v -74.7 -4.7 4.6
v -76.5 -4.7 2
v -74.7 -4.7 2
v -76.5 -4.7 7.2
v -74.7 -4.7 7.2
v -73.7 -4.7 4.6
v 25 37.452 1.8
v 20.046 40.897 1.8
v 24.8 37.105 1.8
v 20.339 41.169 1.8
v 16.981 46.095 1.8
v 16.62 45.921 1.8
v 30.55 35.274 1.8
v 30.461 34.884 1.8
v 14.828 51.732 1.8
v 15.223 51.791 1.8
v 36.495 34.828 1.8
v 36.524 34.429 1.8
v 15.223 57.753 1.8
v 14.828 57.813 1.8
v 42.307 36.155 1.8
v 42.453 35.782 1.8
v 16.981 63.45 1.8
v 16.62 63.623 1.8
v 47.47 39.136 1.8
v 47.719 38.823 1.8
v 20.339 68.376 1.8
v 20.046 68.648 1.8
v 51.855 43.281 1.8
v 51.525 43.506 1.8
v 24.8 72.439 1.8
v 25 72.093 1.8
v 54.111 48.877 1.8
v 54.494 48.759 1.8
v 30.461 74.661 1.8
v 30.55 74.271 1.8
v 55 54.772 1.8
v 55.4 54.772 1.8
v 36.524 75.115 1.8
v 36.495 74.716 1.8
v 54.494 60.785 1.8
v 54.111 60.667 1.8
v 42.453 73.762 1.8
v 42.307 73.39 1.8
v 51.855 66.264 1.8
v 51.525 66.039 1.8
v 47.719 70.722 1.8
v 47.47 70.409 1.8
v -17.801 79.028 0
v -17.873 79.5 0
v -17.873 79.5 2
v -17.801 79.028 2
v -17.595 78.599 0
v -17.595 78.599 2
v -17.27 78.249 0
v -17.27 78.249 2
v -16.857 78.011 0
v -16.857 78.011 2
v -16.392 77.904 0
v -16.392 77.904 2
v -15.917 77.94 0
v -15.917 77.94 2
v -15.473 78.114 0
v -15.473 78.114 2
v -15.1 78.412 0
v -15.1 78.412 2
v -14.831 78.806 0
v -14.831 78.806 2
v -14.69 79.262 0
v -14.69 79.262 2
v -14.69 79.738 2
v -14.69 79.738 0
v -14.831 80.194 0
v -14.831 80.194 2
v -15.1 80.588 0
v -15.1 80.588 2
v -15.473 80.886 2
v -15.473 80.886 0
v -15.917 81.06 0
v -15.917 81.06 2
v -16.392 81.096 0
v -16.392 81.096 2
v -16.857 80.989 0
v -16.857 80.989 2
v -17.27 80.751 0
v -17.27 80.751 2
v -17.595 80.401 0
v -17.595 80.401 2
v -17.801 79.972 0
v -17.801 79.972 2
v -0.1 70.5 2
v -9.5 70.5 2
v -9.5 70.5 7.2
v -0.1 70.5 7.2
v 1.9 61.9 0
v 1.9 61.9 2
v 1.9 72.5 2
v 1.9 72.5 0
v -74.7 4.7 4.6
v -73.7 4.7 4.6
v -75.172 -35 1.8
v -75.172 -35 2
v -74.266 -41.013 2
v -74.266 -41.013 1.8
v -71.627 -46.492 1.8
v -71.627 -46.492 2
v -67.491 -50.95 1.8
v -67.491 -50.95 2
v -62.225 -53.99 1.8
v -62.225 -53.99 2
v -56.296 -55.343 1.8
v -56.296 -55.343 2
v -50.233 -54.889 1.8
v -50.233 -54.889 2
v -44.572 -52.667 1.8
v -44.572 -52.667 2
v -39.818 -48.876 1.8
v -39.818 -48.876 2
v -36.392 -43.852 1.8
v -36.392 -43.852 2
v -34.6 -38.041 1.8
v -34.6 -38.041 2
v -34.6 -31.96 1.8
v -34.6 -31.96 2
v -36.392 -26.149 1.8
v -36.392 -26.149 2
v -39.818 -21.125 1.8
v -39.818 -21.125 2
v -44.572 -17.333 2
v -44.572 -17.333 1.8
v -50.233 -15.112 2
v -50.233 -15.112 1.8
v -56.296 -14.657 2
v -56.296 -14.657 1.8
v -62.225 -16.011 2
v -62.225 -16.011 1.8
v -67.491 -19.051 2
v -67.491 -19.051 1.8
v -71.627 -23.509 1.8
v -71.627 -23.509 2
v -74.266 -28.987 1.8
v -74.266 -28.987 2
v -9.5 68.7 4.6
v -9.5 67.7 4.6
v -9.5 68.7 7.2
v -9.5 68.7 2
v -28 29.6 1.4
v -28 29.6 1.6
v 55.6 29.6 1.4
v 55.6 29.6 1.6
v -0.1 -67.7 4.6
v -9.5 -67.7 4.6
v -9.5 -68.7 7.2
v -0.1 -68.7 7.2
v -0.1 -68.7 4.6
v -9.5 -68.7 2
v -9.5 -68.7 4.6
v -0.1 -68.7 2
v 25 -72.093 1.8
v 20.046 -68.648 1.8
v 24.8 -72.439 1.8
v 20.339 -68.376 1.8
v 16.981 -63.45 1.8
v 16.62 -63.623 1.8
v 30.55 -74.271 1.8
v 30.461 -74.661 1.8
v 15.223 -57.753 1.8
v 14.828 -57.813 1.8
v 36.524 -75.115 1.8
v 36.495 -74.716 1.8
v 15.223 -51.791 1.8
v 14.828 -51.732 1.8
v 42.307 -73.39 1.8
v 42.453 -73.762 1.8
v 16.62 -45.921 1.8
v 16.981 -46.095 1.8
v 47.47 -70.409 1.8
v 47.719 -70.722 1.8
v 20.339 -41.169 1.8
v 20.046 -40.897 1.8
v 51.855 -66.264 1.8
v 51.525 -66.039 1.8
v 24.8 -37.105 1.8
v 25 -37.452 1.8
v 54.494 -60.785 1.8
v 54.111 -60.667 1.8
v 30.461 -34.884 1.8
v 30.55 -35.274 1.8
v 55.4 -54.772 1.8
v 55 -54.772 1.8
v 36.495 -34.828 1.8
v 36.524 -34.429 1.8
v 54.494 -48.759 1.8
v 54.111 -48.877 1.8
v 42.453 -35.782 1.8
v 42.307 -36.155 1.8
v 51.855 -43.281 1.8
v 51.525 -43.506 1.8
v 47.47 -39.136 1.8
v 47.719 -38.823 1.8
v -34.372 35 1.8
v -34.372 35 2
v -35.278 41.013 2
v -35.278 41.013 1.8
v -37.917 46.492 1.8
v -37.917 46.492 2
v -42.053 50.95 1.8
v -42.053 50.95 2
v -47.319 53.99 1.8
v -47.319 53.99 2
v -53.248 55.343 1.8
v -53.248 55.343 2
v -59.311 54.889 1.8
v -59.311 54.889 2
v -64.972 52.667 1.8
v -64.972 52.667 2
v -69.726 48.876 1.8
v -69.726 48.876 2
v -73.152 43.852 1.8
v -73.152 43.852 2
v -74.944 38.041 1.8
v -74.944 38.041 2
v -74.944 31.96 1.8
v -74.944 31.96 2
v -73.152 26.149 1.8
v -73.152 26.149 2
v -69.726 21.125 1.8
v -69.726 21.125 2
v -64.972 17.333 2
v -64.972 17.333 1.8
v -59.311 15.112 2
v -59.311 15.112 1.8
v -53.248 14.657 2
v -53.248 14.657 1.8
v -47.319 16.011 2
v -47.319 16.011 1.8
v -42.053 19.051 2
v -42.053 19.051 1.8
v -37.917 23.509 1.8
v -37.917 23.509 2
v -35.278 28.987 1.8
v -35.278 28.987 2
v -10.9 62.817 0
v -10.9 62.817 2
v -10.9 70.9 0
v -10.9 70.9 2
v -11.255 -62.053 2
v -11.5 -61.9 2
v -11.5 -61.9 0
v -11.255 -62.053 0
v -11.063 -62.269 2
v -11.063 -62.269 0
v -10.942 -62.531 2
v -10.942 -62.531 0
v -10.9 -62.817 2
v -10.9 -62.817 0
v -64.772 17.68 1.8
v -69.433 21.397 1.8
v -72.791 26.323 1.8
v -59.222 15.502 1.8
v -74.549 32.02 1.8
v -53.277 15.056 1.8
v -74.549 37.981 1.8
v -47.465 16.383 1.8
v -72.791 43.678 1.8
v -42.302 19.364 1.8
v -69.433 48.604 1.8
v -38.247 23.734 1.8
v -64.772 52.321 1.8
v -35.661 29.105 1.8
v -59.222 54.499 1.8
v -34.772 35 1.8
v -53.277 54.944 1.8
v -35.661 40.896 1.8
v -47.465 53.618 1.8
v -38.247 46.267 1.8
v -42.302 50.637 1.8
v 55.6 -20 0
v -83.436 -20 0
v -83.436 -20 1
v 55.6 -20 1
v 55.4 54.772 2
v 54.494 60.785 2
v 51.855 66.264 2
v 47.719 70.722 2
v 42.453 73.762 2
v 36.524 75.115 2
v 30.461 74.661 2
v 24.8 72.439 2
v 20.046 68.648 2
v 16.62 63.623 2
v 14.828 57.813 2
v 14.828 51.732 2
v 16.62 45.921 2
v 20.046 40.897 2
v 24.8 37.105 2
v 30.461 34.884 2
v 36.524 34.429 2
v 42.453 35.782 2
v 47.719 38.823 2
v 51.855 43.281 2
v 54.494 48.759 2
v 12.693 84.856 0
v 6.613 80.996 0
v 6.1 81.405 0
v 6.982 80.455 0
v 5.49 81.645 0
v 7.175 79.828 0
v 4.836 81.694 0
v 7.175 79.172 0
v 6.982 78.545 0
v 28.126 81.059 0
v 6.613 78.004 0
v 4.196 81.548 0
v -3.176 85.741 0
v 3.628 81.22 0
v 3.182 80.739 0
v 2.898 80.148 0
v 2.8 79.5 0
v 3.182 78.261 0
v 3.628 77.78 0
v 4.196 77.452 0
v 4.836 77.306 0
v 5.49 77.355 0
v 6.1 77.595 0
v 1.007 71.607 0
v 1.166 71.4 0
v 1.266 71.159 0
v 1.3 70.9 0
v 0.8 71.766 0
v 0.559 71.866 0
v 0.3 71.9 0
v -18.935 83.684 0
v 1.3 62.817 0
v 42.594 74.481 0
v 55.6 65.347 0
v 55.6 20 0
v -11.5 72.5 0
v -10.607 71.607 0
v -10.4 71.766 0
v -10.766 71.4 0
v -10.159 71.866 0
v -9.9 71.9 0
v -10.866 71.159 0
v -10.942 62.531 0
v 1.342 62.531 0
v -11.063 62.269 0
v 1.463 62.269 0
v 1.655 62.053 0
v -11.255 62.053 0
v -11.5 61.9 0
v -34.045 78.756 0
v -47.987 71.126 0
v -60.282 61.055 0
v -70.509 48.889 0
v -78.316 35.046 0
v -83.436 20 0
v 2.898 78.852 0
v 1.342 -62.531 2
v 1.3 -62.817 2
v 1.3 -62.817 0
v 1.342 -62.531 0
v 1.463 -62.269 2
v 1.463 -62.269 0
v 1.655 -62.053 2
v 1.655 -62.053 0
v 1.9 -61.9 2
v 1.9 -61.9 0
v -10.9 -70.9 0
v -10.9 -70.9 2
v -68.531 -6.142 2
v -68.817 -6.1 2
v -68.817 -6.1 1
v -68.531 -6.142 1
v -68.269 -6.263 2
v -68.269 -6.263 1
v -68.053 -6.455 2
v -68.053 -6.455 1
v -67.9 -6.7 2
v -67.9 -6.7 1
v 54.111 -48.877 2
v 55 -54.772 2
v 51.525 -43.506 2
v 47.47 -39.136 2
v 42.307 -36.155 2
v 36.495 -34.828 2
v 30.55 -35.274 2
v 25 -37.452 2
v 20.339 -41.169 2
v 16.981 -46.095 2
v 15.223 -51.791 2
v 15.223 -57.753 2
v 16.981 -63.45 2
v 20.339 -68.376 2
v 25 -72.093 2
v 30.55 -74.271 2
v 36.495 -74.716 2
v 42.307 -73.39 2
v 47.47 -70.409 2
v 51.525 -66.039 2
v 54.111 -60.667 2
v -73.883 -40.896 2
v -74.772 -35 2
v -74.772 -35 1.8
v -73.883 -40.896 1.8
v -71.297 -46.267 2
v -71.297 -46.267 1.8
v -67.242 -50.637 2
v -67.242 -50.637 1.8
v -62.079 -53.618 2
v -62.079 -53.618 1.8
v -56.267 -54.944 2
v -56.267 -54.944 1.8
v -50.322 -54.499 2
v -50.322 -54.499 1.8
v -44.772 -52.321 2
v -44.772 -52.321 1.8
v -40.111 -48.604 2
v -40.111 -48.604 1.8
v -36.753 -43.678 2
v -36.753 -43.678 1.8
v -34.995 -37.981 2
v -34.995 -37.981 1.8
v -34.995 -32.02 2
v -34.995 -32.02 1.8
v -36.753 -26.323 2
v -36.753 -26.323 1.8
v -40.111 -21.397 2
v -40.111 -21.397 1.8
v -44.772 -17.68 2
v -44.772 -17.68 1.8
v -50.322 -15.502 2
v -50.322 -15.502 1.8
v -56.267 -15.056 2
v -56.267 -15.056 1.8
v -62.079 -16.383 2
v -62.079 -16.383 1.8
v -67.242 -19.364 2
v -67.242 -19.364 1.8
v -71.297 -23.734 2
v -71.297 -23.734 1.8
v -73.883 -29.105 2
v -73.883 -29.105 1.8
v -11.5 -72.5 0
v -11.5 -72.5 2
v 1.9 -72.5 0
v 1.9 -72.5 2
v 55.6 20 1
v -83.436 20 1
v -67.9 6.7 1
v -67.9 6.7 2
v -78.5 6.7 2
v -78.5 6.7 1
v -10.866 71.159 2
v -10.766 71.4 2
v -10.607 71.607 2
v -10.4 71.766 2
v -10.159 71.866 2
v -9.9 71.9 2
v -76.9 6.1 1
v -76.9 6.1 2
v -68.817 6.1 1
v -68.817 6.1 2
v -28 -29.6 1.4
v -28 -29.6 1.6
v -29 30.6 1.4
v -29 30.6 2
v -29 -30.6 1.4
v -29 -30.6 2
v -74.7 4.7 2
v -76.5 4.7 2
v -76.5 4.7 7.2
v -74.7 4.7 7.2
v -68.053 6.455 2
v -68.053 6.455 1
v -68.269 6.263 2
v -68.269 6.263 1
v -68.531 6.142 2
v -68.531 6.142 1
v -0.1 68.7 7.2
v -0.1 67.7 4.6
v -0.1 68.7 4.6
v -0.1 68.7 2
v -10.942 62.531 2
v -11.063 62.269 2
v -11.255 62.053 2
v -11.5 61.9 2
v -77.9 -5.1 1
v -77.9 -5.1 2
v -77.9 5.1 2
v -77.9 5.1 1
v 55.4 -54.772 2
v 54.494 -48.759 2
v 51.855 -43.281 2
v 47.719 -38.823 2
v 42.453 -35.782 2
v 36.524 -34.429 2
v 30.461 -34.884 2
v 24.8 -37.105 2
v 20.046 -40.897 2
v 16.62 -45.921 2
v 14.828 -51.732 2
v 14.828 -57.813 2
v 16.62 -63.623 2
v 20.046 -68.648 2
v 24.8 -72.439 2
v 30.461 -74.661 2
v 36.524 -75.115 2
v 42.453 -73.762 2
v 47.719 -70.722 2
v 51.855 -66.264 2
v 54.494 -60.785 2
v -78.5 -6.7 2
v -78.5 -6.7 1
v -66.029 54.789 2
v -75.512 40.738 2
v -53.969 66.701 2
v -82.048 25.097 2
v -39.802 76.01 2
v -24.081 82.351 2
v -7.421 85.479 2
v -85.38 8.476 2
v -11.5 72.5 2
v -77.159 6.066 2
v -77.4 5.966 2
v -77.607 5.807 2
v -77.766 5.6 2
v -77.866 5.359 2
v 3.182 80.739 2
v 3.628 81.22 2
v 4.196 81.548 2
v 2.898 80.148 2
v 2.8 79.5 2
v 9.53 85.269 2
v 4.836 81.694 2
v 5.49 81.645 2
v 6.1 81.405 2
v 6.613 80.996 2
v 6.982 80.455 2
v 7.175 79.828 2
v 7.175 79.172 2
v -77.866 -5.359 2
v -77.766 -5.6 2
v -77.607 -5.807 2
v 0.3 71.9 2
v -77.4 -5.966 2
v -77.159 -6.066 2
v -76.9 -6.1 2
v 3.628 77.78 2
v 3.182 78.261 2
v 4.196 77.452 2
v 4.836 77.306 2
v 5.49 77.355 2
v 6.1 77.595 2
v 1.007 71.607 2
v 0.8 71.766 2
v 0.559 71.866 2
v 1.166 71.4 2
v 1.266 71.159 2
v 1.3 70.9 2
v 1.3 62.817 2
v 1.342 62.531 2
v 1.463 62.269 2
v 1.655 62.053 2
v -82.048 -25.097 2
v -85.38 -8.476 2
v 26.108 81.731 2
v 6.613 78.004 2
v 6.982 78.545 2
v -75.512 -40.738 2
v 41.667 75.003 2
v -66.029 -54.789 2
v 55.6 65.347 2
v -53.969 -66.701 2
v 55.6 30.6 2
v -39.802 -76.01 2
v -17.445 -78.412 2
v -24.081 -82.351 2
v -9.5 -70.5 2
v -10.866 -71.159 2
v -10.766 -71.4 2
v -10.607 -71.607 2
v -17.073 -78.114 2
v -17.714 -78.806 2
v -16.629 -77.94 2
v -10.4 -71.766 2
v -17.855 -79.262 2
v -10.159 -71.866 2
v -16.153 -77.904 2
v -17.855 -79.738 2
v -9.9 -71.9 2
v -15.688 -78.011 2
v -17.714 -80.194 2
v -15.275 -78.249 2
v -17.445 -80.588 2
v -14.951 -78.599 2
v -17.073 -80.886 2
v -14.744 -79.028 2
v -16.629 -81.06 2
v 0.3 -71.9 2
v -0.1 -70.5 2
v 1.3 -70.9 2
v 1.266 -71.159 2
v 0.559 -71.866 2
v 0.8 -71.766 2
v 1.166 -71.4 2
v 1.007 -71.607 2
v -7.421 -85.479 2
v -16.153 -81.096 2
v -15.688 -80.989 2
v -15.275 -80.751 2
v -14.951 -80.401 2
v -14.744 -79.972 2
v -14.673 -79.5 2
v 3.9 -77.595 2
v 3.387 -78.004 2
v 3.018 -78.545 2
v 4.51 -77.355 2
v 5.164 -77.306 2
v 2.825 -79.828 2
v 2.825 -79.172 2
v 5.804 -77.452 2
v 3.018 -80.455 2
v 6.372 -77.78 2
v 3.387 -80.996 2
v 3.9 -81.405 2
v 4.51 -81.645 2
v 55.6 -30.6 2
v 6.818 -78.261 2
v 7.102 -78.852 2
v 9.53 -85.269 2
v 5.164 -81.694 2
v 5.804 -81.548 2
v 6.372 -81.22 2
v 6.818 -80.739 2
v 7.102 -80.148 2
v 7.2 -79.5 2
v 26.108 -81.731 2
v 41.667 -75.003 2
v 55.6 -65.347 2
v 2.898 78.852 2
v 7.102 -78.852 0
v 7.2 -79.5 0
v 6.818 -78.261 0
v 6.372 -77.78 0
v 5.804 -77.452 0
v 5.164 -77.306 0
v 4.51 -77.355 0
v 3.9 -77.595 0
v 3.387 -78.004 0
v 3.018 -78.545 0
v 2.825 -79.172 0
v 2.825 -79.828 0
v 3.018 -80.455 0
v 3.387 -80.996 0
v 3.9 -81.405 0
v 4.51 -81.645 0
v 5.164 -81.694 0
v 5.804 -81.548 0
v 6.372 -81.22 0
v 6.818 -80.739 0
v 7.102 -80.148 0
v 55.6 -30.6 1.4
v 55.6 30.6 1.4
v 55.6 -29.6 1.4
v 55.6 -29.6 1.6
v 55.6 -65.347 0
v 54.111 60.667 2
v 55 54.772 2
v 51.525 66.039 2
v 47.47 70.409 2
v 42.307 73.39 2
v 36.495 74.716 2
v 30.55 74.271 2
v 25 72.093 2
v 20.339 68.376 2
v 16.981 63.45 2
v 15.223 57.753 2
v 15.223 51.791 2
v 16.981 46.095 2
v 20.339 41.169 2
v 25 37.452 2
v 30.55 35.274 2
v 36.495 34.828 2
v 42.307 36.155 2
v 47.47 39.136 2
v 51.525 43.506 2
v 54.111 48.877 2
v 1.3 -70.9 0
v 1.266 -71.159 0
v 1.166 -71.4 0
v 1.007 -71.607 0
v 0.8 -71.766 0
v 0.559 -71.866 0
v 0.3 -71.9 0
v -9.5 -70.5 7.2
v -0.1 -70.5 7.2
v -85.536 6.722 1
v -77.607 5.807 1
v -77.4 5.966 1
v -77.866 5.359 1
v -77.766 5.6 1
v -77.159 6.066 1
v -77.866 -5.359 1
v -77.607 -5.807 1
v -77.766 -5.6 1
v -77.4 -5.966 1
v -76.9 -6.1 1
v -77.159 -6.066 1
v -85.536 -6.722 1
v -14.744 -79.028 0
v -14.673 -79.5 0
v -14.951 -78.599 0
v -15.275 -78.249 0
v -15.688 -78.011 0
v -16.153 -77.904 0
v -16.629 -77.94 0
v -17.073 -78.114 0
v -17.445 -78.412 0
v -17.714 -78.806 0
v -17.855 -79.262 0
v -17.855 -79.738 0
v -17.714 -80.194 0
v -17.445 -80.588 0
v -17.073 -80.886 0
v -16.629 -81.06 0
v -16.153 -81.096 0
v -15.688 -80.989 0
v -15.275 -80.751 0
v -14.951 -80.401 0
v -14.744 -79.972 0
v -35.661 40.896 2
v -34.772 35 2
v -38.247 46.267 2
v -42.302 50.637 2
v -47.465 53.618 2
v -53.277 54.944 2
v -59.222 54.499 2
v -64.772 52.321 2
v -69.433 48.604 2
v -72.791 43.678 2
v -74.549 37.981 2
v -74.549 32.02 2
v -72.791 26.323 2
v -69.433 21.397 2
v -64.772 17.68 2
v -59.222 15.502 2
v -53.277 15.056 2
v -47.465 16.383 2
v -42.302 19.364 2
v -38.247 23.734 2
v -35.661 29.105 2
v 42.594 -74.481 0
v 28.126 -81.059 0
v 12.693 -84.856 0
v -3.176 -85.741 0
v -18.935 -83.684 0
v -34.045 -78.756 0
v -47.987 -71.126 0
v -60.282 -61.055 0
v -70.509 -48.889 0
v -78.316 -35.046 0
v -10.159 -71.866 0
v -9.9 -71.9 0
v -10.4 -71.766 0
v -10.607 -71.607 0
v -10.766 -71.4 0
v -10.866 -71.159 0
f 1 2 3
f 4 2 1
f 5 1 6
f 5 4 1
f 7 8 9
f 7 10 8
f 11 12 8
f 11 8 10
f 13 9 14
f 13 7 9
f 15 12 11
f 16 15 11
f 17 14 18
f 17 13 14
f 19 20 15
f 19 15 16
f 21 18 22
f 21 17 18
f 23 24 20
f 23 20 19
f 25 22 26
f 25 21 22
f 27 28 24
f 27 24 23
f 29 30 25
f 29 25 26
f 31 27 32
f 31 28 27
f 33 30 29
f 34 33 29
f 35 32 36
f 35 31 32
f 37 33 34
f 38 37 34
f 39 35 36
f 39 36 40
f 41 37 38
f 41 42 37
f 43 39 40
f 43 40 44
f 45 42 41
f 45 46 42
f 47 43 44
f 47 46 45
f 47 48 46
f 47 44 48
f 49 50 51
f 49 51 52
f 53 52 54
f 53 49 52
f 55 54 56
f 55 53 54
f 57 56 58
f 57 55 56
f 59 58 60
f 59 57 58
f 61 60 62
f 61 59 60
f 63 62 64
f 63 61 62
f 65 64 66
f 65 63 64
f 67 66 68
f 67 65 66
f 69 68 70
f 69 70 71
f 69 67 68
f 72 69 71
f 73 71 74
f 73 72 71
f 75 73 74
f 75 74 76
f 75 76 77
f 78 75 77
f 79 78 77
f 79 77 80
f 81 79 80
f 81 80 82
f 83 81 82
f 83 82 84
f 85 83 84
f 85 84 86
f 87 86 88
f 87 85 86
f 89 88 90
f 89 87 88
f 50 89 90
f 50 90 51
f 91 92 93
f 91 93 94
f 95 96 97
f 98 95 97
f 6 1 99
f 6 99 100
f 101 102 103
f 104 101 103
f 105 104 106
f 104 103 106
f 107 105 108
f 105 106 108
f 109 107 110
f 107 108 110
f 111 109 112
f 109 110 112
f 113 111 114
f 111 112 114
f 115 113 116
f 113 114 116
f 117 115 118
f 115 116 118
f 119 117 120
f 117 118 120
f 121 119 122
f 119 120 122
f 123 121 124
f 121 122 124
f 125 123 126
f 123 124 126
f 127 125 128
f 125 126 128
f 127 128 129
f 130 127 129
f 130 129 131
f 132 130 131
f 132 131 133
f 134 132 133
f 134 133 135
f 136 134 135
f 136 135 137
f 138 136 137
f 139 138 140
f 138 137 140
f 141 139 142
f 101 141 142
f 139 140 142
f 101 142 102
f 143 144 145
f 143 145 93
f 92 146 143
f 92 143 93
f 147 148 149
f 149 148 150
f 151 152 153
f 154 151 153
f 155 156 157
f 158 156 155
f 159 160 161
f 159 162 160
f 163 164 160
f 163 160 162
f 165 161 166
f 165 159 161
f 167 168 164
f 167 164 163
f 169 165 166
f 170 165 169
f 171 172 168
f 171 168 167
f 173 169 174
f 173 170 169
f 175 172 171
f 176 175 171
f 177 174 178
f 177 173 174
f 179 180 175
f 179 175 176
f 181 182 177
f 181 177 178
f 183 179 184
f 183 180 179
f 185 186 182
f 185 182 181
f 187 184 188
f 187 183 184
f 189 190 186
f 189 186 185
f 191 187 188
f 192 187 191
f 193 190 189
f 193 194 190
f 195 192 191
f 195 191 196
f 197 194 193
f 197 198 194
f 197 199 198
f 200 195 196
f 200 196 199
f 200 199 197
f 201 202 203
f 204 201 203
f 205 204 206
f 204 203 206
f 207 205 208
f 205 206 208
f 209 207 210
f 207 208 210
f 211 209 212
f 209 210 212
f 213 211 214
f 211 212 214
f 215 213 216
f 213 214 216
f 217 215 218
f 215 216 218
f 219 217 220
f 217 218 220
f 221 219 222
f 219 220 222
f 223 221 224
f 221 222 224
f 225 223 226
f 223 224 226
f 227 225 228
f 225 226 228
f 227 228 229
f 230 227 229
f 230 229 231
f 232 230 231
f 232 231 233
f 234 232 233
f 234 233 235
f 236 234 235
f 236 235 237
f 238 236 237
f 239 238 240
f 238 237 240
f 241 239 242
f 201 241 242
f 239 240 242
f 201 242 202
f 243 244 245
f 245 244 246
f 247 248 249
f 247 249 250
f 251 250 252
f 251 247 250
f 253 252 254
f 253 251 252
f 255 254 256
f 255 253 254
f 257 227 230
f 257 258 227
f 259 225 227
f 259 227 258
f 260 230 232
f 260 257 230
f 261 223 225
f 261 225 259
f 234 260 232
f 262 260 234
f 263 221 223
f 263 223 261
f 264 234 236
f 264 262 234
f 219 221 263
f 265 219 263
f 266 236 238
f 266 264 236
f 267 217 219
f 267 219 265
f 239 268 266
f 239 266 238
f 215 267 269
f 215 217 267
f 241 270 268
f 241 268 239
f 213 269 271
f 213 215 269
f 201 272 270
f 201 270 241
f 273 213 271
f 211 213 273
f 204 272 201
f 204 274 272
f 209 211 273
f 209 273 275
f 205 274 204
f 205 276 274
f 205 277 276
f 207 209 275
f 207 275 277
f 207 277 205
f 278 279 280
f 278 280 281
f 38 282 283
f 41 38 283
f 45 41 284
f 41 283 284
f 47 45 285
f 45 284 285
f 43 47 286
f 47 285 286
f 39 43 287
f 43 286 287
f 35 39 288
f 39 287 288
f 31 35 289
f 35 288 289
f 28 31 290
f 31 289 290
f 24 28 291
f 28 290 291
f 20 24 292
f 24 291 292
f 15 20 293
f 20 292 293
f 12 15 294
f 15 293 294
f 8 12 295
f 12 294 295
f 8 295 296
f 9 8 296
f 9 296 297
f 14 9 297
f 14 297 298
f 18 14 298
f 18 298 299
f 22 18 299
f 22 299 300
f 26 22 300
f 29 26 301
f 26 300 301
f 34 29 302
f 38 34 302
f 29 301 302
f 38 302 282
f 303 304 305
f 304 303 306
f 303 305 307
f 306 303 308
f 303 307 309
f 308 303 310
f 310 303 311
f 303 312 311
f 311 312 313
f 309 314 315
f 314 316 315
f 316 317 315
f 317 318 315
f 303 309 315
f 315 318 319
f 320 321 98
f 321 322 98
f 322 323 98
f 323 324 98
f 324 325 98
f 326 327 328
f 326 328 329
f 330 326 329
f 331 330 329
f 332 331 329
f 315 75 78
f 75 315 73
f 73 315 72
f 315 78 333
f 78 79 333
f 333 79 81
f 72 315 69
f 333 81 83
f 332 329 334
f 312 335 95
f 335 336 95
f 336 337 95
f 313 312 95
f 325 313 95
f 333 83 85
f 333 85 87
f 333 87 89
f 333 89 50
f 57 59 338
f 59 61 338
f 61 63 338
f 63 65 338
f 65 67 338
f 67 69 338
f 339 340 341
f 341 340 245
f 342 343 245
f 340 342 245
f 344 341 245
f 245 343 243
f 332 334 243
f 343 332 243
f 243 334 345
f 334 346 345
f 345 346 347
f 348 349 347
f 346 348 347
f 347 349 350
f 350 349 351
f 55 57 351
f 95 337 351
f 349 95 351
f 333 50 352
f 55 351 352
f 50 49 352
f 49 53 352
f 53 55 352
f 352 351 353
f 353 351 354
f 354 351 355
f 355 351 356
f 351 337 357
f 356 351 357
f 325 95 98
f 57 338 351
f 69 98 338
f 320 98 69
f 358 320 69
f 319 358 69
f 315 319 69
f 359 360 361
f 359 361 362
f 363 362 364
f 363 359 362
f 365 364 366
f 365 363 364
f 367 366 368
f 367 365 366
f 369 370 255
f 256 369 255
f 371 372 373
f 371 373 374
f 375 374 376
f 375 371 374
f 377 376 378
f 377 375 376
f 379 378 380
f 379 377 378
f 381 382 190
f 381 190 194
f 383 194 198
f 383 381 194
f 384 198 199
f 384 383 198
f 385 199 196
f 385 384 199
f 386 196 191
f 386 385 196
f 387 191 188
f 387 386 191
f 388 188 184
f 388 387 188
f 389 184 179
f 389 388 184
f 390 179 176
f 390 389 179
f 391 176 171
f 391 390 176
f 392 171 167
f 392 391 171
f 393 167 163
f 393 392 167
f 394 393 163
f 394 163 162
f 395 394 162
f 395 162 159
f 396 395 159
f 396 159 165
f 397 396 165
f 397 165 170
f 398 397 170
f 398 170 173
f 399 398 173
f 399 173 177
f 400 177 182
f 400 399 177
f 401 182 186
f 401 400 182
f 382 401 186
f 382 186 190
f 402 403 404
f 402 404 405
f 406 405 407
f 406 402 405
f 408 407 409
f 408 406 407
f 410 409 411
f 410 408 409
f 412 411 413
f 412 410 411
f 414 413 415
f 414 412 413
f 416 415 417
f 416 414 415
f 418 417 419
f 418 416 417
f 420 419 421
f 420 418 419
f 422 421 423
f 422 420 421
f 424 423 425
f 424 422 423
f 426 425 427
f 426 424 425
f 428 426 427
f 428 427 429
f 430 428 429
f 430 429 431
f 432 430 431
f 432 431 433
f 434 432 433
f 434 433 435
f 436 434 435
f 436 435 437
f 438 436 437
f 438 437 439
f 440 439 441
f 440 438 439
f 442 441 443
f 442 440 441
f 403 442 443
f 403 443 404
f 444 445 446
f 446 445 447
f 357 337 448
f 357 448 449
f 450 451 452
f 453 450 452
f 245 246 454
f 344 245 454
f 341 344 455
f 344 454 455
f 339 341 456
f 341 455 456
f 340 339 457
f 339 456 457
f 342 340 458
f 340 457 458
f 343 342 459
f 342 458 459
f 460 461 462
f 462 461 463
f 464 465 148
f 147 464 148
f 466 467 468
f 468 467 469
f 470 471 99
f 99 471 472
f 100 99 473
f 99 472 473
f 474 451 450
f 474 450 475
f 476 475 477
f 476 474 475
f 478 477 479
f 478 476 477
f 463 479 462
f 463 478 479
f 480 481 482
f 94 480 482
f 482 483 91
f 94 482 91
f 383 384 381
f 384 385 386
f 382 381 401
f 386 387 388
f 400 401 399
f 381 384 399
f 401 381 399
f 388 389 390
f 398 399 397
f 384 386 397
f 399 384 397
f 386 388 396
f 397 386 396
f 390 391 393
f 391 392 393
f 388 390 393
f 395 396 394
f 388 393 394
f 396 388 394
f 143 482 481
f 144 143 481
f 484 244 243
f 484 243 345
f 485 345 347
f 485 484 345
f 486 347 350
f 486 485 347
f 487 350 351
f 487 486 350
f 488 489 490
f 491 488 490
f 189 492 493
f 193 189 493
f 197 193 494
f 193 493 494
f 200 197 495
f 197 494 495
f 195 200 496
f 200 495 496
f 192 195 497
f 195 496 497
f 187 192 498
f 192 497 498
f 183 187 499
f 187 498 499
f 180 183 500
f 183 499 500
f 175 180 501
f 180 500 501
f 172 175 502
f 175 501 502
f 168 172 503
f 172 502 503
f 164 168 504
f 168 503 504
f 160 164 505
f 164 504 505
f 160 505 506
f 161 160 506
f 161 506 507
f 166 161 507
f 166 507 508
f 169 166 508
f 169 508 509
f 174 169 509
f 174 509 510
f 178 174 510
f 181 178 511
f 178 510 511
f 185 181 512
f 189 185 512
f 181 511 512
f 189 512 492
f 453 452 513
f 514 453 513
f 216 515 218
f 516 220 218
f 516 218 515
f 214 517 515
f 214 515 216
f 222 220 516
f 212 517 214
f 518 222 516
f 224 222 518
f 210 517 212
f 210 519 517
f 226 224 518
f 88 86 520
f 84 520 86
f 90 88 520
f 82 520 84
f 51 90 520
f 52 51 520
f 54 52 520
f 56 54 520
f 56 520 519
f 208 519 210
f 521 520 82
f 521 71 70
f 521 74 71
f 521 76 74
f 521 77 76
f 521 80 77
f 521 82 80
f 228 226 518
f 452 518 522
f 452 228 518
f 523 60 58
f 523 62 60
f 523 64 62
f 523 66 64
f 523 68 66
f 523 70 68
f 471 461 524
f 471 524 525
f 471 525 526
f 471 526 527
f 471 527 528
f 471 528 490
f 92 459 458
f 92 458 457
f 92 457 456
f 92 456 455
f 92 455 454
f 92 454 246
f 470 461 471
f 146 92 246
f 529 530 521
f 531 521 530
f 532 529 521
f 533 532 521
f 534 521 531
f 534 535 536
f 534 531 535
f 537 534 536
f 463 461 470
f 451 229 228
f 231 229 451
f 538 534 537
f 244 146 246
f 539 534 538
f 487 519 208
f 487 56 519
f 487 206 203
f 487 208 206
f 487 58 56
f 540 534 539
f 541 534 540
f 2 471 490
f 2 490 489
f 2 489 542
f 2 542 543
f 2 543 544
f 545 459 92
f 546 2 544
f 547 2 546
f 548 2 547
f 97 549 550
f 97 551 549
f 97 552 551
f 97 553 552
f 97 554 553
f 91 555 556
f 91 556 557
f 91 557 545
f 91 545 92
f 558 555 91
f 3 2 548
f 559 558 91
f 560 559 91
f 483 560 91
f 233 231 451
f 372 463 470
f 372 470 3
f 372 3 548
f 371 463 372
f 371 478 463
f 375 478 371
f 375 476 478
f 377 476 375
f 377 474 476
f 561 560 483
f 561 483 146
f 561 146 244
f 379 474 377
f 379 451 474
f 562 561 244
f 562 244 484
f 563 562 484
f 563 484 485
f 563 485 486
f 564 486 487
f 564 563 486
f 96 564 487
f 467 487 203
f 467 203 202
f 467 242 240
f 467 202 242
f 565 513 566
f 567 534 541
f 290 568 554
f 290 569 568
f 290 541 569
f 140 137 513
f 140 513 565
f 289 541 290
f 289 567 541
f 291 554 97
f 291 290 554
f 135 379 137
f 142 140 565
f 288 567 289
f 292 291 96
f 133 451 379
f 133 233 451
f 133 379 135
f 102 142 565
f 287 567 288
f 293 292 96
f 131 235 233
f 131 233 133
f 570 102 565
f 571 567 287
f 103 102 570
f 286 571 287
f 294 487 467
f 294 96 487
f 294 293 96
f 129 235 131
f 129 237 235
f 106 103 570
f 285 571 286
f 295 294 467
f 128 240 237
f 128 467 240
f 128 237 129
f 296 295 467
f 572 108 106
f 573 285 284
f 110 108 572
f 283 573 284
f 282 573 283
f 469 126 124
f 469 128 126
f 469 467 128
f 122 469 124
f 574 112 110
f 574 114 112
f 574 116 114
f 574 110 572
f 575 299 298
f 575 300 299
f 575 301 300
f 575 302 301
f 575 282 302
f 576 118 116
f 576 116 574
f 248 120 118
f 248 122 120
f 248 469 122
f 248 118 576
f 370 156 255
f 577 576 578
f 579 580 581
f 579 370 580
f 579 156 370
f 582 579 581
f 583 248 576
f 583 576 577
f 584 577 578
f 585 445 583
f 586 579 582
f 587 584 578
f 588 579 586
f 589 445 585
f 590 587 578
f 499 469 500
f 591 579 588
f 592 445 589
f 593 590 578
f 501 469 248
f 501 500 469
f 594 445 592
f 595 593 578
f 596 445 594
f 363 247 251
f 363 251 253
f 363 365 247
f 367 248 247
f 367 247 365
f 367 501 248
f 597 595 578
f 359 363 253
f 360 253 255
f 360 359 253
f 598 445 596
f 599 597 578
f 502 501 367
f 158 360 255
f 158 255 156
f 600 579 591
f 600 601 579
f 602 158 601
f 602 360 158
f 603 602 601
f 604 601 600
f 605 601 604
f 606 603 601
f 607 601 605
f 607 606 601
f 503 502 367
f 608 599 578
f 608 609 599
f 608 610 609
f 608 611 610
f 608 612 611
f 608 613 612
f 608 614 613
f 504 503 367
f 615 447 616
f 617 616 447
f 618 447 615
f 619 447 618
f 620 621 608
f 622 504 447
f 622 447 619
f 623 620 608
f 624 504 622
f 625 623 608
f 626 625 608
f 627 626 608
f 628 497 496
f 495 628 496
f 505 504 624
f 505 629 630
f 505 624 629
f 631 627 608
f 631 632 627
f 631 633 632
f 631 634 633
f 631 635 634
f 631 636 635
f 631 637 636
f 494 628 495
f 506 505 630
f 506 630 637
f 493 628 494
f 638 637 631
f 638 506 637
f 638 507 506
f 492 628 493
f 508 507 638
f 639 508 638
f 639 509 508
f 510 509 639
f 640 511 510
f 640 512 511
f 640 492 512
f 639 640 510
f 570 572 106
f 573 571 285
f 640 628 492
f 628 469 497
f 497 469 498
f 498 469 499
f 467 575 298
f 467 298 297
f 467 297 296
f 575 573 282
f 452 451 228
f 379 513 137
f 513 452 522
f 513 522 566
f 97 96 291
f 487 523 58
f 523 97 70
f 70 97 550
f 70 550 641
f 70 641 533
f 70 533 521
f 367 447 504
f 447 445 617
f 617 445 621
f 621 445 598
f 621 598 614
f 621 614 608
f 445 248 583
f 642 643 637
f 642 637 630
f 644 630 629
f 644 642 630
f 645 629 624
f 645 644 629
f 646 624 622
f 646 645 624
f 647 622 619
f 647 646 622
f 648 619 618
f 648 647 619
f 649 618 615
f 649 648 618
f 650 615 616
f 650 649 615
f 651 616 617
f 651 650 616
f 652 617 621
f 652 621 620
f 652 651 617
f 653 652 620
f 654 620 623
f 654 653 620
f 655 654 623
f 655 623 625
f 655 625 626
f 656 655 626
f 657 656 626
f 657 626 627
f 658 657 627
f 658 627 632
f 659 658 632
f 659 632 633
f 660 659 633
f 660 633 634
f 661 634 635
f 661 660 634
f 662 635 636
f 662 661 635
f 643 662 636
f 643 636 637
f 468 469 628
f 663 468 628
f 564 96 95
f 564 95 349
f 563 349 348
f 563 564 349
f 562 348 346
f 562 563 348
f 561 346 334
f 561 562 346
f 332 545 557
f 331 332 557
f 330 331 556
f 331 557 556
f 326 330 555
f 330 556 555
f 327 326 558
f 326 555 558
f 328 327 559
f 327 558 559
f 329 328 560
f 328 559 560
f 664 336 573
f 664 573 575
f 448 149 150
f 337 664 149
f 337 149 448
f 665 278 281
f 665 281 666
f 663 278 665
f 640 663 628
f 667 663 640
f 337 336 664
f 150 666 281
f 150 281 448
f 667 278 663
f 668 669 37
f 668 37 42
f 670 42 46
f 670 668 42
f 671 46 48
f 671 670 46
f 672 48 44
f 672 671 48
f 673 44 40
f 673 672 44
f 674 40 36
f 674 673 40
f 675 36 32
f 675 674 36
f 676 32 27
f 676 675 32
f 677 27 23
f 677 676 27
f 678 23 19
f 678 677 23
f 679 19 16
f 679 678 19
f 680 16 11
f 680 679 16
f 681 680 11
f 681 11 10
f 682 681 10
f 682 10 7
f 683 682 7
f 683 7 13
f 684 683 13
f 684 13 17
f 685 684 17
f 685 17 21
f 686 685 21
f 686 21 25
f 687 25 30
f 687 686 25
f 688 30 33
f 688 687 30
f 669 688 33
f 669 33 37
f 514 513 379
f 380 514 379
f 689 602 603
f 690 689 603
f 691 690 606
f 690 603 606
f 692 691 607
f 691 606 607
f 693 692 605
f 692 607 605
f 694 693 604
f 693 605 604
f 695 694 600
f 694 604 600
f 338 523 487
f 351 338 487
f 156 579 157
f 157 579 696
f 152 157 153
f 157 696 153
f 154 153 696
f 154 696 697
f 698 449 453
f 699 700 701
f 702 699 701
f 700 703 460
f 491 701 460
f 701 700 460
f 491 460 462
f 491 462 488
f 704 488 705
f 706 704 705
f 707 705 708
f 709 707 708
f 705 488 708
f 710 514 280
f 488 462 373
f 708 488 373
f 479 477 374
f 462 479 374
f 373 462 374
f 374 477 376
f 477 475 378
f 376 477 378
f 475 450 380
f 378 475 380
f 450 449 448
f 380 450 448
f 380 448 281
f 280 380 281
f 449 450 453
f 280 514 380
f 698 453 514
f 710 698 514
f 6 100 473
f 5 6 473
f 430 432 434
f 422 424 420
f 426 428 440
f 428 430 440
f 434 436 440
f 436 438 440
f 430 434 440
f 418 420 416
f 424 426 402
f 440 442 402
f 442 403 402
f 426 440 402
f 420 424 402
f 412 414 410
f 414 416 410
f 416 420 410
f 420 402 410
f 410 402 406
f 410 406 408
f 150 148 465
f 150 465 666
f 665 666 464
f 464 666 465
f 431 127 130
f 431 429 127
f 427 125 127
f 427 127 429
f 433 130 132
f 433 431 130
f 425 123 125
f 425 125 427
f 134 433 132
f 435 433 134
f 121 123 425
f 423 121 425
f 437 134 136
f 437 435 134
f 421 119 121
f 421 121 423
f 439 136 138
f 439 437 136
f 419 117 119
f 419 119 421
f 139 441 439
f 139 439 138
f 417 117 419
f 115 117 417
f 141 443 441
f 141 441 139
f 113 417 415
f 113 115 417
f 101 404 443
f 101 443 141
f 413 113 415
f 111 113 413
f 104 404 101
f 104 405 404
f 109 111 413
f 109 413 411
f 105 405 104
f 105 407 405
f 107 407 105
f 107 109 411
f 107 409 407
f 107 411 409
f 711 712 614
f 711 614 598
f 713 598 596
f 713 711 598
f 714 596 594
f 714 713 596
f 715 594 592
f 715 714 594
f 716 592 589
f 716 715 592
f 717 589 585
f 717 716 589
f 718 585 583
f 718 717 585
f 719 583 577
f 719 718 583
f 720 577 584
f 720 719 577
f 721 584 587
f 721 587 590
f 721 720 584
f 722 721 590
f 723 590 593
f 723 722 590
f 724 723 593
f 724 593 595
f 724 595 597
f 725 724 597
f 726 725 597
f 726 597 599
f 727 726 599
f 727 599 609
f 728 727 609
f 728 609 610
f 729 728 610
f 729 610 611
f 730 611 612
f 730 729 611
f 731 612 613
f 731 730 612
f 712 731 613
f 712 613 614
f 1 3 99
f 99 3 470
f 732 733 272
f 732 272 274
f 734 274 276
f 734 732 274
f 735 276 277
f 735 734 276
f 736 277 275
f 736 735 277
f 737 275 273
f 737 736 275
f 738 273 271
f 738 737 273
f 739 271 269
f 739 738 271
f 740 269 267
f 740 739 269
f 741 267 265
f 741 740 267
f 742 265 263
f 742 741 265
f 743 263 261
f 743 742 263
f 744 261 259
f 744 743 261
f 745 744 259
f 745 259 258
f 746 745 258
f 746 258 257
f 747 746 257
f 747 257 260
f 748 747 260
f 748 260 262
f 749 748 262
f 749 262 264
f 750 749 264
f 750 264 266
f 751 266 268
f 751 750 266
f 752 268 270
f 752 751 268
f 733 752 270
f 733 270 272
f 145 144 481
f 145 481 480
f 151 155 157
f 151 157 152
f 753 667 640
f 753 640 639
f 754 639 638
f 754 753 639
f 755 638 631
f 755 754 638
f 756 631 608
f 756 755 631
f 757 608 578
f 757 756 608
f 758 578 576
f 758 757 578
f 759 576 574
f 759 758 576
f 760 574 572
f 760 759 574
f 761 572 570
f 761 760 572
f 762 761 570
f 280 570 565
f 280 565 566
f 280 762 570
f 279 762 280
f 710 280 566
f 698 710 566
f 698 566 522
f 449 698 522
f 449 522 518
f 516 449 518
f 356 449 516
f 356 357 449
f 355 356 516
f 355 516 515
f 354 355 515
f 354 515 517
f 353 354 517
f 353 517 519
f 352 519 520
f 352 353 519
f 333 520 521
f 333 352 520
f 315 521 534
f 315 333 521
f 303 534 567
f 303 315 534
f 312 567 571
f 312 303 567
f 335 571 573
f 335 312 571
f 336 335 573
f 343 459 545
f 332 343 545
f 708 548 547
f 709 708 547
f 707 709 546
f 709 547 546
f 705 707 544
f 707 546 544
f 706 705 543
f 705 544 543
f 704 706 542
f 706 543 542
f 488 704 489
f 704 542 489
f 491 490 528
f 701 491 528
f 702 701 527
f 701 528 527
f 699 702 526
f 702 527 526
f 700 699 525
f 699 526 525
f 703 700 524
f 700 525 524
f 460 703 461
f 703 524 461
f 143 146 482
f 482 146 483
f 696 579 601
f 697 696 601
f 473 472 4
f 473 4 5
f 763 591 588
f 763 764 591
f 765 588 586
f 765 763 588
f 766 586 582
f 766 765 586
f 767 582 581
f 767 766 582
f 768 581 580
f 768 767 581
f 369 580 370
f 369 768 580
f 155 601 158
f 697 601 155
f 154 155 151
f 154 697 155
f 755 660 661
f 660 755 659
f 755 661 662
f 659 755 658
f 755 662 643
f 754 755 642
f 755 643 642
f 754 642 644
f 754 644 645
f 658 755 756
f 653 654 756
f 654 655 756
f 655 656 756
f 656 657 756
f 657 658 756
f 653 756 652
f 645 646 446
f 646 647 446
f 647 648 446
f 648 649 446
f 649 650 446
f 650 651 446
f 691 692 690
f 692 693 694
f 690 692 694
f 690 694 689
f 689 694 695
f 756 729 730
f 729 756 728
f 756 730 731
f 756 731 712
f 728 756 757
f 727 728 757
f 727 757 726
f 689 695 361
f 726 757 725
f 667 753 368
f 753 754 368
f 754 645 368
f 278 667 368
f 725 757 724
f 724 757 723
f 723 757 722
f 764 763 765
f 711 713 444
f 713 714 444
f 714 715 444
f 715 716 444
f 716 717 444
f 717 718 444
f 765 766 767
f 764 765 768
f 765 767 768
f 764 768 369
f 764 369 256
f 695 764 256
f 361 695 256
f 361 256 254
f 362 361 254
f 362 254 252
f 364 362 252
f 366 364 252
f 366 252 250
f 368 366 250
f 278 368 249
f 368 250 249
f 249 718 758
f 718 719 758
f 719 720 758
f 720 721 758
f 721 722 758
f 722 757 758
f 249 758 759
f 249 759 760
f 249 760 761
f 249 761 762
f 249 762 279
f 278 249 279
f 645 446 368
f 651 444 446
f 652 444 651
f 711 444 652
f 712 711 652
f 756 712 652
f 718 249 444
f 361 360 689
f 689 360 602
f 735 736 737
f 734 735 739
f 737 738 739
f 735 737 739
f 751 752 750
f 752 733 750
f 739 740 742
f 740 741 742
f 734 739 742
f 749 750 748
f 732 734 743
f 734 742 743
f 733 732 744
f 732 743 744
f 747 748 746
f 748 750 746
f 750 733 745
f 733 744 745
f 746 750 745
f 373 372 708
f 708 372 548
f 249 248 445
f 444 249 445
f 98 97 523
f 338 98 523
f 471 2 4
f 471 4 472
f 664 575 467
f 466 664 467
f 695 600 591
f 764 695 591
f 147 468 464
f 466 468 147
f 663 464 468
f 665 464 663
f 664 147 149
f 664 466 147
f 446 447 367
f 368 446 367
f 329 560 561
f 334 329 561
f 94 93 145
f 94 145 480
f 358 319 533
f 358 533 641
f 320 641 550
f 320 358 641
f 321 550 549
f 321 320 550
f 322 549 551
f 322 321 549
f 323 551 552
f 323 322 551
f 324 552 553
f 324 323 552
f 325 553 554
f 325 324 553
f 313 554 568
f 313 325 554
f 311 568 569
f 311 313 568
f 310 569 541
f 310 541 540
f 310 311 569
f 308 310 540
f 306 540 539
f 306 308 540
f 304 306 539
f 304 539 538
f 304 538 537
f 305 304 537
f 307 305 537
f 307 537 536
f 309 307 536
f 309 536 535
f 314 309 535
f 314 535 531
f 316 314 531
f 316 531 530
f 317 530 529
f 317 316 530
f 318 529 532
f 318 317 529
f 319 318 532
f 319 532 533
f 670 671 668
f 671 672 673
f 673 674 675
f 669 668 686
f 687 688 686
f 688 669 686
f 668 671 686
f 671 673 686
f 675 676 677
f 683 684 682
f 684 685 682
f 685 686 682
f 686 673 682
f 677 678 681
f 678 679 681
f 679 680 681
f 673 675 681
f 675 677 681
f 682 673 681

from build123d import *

# Parameters (mm, degrees)
SKETCH1_R           = 2.2
SKETCH1_R_2         = 1.6
BOSS_EXTRUDE1_DEPTH = 2
SKETCH3_R           = 20.4
SKETCH3_R_2         = 20
CUT_EXTRUDE9_DEPTH  = 0.2
SKETCH6_W           = 9.4
SKETCH6_H           = 1.8
BOSS_EXTRUDE2_DEPTH = 5.2
SKETCH7_W           = 1.8
SKETCH7_H           = 9.4
BOSS_EXTRUDE3_DEPTH = 5.2
BOSS_EXTRUDE4_DEPTH = 9.4
CUT_EXTRUDE10_DEPTH = 0.6
SKETCH11_W          = 83.6
SKETCH11_H          = 59.2
CUT_EXTRUDE11_DEPTH = 0.4
BOSS_EXTRUDE5_DEPTH = 9.4
CUT_EXTRUDE12_DEPTH = 1
CUT_EXTRUDE13_DEPTH = 10
FILLET1_R           = 1
FILLET4_R           = 1
FILLET8_R           = 1
FILLET9_R           = 1
FILLET10_R          = 1


with BuildPart() as part:
    # Sketch1 → Boss-Extrude1 (new body)
    with BuildSketch(Plane(origin=(0, 0, 0), x_dir=(0, 1, 0), z_dir=(0, 0, 1))):
        with BuildLine():
            Line((65.347379442, -55.6), (-65.347379442, -55.6))
            ThreePointArc((-65.347379442, -55.6), (0, 85.8), (65.347379442, -55.6))
        make_face()
        with Locations(Location((-79.5, -5, 0), (0, 0, 270))):
            Circle(SKETCH1_R, mode=Mode.SUBTRACT)
        with Locations(Location((-79.5, 16.27256024, 0), (0, 0, 270))):
            Circle(SKETCH1_R_2, mode=Mode.SUBTRACT)
        with Locations(Location((79.5, 16.27256024, 0), (0, 0, 90))):
            Circle(SKETCH1_R_2, mode=Mode.SUBTRACT)
        with Locations(Location((79.5, -5, 0), (0, 0, 90))):
            Circle(SKETCH1_R, mode=Mode.SUBTRACT)
    extrude(amount=BOSS_EXTRUDE1_DEPTH)

    # Sketch3 → Cut-Extrude9 (cut)
    # profile 1 of 4: a face of its own
    with BuildSketch(Plane.XY.offset(2)):
        with Locations((-54.772, 35.000400226)):
            Circle(SKETCH3_R)
        with Locations((-54.772, 35.000400226)):
            Circle(SKETCH3_R_2, mode=Mode.SUBTRACT)
    # profile 2 of 4: a face of its own
    with BuildSketch(Plane.XY.offset(2)):
        with Locations(Location((-54.772, -35.000400226, 0), (0, 0, 180))):
            Circle(SKETCH3_R)
        with Locations(Location((-54.772, -35.000400226, 0), (0, 0, 180))):
            Circle(SKETCH3_R_2, mode=Mode.SUBTRACT)
    # profile 3 of 4: a face of its own
    with BuildSketch(Plane.XY.offset(2)):
        with Locations((35, -54.772255751)):
            Circle(SKETCH3_R)
        with Locations((35, -54.772255751)):
            Circle(SKETCH3_R_2, mode=Mode.SUBTRACT)
    # profile 4 of 4: a face of its own
    with BuildSketch(Plane.XY.offset(2)):
        with Locations((35, 54.772255751)):
            Circle(SKETCH3_R)
        with Locations((35, 54.772255751)):
            Circle(SKETCH3_R_2, mode=Mode.SUBTRACT)
    extrude(amount=-CUT_EXTRUDE9_DEPTH, mode=Mode.SUBTRACT)

    # Sketch6 → Boss-Extrude2 (add)
    with BuildSketch(Plane.XY.offset(2)):
        with Locations((-4.8, -69.6)):
            Rectangle(SKETCH6_W, SKETCH6_H)
        with Locations((-4.8, 69.6)):
            Rectangle(SKETCH6_W, SKETCH6_H)
    extrude(amount=BOSS_EXTRUDE2_DEPTH)

    # Sketch7 → Boss-Extrude3 (add)
    with BuildSketch(Plane.XY.offset(2)):
        with Locations((-75.6, 0)):
            Rectangle(SKETCH7_W, SKETCH7_H)
    extrude(amount=BOSS_EXTRUDE3_DEPTH)

    # Sketch8 → Boss-Extrude4 (add)
    with BuildSketch(Plane.YZ.offset(-0.1)):
        Polygon((-68.7, 7.2), (-68.7, 4.6), (-67.7, 4.6), align=None)
        Polygon((67.7, 4.6), (68.7, 7.2), (68.7, 4.6), align=None)
    extrude(amount=-BOSS_EXTRUDE4_DEPTH)

    # Sketch10 → Cut-Extrude10 (cut)
    with BuildSketch(Plane.XY.offset(2)):
        Polygon((55.6, -29.6), (-28, -29.6), (-28, 29.6), (55.6, 29.6), (55.6, 30.6), (-29, 30.6), (-29, -30.6), (55.6, -30.6), align=None)
    extrude(amount=-CUT_EXTRUDE10_DEPTH, mode=Mode.SUBTRACT)

    # Sketch11 → Cut-Extrude11 (cut)
    with BuildSketch(Plane.XY.offset(2)):
        with Locations((13.8, 0)):
            Rectangle(SKETCH11_W, SKETCH11_H)
    extrude(amount=-CUT_EXTRUDE11_DEPTH, mode=Mode.SUBTRACT)

    # Sketch13 → Boss-Extrude5 (add)
    with BuildSketch(Plane.XZ.offset(4.7)):
        Polygon((-74.7, 7.2), (-74.7, 4.6), (-73.7, 4.6), align=None)
    extrude(amount=-BOSS_EXTRUDE5_DEPTH)

    # Sketch15 → Cut-Extrude12 (cut)
    with BuildSketch(Plane(origin=(0, 0, 0), x_dir=(1, 0, 0), z_dir=(0, 0, -1))):
        with BuildLine():
            Line((-83.436442877, 20), (55.6, 20))
            Line((55.6, 20), (55.6, -20))
            Line((55.6, -20), (-83.436442877, -20))
            ThreePointArc((-83.436442877, -20), (-85.8, 0), (-83.436442877, 20))
        make_face()
    extrude(amount=-CUT_EXTRUDE12_DEPTH, mode=Mode.SUBTRACT)

    # Sketch17 → Cut-Extrude13 (cut)
    with BuildSketch(Plane.XY.offset(2)):
        Polygon((-10.9, -71.9), (-10.9, -61.9), (-11.5, -61.9), (-11.5, -72.5), (1.9, -72.5), (1.9, -61.9), (1.3, -61.9), (1.3, -71.9), align=None)
        Polygon((1.9, 72.5), (-11.5, 72.5), (-11.5, 61.9), (-10.9, 61.9), (-10.9, 71.9), (1.3, 71.9), (1.3, 61.9), (1.9, 61.9), align=None)
        Polygon((-78.5, 6.7), (-78.5, -6.7), (-67.9, -6.7), (-67.9, -6.1), (-77.9, -6.1), (-77.9, 6.1), (-67.9, 6.1), (-67.9, 6.7), align=None)
    extrude(amount=-CUT_EXTRUDE13_DEPTH, mode=Mode.SUBTRACT)

    # Fillet1
    fillet1_edges = [part.edges().sort_by_distance(p)[0] for p in [
        (-10.9, -71.9, 1),
    ]]
    fillet(fillet1_edges, radius=FILLET1_R)

    # Fillet4
    # the kernel refuses this fillet: 1 mm, written as the material it adds along each edge
    with BuildSketch(Plane(origin=(1.3, -61.9, 2), x_dir=(0, -1, 0), z_dir=(0, 0, -1))) as fillet4_piece_1:
        with BuildLine():
            CenterArc((0.916515139, -1), FILLET4_R, 90, 66.421821522)
            Line((0, -0.6), (0, 0))
            Line((0, 0), (0.916515139, 0))
        make_face()
    extrude(amount=2)
    # the kernel refuses this fillet: 1 mm, written as the material it takes off along each edge
    with BuildSketch(Plane(origin=(1.3, -71.9, 4.5), x_dir=(-1, 0, 0), z_dir=(0, 0, -1))) as fillet4_2_piece_1:
        with BuildLine():
            CenterArc((FILLET4_R, FILLET4_R), FILLET4_R, 180, 90)
            Line((0, FILLET4_R), (0, 0))
            Line((0, 0), (FILLET4_R, 0))
        make_face()
    extrude(amount=7, mode=Mode.SUBTRACT)

    # Fillet8
    # the kernel refuses this fillet: 1 mm, written as the material it adds along each edge
    with BuildSketch(Plane(origin=(-10.9, -61.9, 2), x_dir=(0, -1, 0), z_dir=(0, 0, -1))) as fillet8_piece_1:
        with BuildLine():
            CenterArc((0.916515139, 1), FILLET8_R, 203.578178478, 66.421821522)
            Line((0, 0.6), (-0.018330303, 0.592))
            ThreePointArc((-0.018330303, 0.592), (-0.02, 0.3), (-0.02, 0))
            Line((-0.02, 0), (0, -0.02))
            Line((0, -0.02), (0.916515139, -0.02))
            Line((0.916515139, -0.02), (0.916515139, 0))
        make_face()
    extrude(amount=2)

    # Fillet9
    # the kernel refuses this fillet: 1 mm, written as the material it adds along each edge
    with BuildSketch(Plane(origin=(-10.9, 61.9, 2), x_dir=(-1, 0, 0), z_dir=(0, 0, -1))) as fillet9_piece_1:
        with BuildLine():
            CenterArc((1, 0.916515139), FILLET9_R, 180, 66.421821522)
            Line((0, 0.916515139), (0, 0))
            Line((0, 0), (0.6, 0))
        make_face()
    extrude(amount=2)
    with BuildSketch(Plane(origin=(1.3, 61.9, 2), x_dir=(1, 0, 0), z_dir=(0, 0, -1))) as fillet9_piece_2:
        with BuildLine():
            CenterArc((1, -0.916515139), FILLET9_R, 113.578178478, 66.421821522)
            Line((0, -0.916515139), (0, 0))
            Line((0, 0), (0.6, 0))
        make_face()
    extrude(amount=2)
    # the kernel refuses this fillet: 1 mm, written as the material it takes off along each edge
    with BuildSketch(Plane(origin=(1.3, 71.9, 4.5), x_dir=(0, -1, 0), z_dir=(0, 0, -1)), Plane(origin=(-10.9, 71.9, 4.5), x_dir=(1, 0, 0), z_dir=(0, 0, -1))) as fillet9_2_piece_1:
        with BuildLine():
            CenterArc((FILLET9_R, FILLET9_R), FILLET9_R, 180, 90)
            Line((0, FILLET9_R), (0, 0))
            Line((0, 0), (FILLET9_R, 0))
        make_face()
    extrude(amount=7, mode=Mode.SUBTRACT)

    # Fillet10
    # the kernel refuses this fillet: 1 mm, written as the material it adds along each edge
    with BuildSketch(Plane(origin=(-67.9, -6.1, 2), x_dir=(0, -1, 0), z_dir=(0, 0, -1))) as fillet10_piece_1:
        with BuildLine():
            CenterArc((1, 0.916515139), FILLET10_R, 180, 66.421821522)
            Line((0, 0.916515139), (0, 0))
            Line((0, 0), (0.6, 0))
        make_face()
    extrude(amount=1)
    with BuildSketch(Plane(origin=(-67.9, 6.1, 2), x_dir=(0, 1, 0), z_dir=(0, 0, -1))) as fillet10_piece_2:
        with BuildLine():
            CenterArc((1, -0.916515139), FILLET10_R, 113.578178478, 66.421821522)
            Line((0, -0.916515139), (0, 0))
            Line((0, 0), (0.6, 0))
        make_face()
    extrude(amount=1)
    # the kernel refuses this fillet: 1 mm, written as the material it takes off along each edge
    with BuildSketch(Plane(origin=(-77.9, -6.1, 4.5), x_dir=(1, 0, 0), z_dir=(0, 0, -1))) as fillet10_2_piece_1:
        with BuildLine():
            CenterArc((FILLET10_R, -FILLET10_R), FILLET10_R, 90, 90)
            Line((0, -FILLET10_R), (0, 0))
            Line((0, 0), (FILLET10_R, 0))
        make_face()
    extrude(amount=6, mode=Mode.SUBTRACT)
    with BuildSketch(Plane(origin=(-77.9, 6.1, 4.5), x_dir=(1, 0, 0), z_dir=(0, 0, -1))) as fillet10_2_piece_2:
        with BuildLine():
            CenterArc((FILLET10_R, FILLET10_R), FILLET10_R, 180, 90)
            Line((0, FILLET10_R), (0, 0))
            Line((0, 0), (FILLET10_R, 0))
        make_face()
    extrude(amount=6, mode=Mode.SUBTRACT)


solid = part.part
